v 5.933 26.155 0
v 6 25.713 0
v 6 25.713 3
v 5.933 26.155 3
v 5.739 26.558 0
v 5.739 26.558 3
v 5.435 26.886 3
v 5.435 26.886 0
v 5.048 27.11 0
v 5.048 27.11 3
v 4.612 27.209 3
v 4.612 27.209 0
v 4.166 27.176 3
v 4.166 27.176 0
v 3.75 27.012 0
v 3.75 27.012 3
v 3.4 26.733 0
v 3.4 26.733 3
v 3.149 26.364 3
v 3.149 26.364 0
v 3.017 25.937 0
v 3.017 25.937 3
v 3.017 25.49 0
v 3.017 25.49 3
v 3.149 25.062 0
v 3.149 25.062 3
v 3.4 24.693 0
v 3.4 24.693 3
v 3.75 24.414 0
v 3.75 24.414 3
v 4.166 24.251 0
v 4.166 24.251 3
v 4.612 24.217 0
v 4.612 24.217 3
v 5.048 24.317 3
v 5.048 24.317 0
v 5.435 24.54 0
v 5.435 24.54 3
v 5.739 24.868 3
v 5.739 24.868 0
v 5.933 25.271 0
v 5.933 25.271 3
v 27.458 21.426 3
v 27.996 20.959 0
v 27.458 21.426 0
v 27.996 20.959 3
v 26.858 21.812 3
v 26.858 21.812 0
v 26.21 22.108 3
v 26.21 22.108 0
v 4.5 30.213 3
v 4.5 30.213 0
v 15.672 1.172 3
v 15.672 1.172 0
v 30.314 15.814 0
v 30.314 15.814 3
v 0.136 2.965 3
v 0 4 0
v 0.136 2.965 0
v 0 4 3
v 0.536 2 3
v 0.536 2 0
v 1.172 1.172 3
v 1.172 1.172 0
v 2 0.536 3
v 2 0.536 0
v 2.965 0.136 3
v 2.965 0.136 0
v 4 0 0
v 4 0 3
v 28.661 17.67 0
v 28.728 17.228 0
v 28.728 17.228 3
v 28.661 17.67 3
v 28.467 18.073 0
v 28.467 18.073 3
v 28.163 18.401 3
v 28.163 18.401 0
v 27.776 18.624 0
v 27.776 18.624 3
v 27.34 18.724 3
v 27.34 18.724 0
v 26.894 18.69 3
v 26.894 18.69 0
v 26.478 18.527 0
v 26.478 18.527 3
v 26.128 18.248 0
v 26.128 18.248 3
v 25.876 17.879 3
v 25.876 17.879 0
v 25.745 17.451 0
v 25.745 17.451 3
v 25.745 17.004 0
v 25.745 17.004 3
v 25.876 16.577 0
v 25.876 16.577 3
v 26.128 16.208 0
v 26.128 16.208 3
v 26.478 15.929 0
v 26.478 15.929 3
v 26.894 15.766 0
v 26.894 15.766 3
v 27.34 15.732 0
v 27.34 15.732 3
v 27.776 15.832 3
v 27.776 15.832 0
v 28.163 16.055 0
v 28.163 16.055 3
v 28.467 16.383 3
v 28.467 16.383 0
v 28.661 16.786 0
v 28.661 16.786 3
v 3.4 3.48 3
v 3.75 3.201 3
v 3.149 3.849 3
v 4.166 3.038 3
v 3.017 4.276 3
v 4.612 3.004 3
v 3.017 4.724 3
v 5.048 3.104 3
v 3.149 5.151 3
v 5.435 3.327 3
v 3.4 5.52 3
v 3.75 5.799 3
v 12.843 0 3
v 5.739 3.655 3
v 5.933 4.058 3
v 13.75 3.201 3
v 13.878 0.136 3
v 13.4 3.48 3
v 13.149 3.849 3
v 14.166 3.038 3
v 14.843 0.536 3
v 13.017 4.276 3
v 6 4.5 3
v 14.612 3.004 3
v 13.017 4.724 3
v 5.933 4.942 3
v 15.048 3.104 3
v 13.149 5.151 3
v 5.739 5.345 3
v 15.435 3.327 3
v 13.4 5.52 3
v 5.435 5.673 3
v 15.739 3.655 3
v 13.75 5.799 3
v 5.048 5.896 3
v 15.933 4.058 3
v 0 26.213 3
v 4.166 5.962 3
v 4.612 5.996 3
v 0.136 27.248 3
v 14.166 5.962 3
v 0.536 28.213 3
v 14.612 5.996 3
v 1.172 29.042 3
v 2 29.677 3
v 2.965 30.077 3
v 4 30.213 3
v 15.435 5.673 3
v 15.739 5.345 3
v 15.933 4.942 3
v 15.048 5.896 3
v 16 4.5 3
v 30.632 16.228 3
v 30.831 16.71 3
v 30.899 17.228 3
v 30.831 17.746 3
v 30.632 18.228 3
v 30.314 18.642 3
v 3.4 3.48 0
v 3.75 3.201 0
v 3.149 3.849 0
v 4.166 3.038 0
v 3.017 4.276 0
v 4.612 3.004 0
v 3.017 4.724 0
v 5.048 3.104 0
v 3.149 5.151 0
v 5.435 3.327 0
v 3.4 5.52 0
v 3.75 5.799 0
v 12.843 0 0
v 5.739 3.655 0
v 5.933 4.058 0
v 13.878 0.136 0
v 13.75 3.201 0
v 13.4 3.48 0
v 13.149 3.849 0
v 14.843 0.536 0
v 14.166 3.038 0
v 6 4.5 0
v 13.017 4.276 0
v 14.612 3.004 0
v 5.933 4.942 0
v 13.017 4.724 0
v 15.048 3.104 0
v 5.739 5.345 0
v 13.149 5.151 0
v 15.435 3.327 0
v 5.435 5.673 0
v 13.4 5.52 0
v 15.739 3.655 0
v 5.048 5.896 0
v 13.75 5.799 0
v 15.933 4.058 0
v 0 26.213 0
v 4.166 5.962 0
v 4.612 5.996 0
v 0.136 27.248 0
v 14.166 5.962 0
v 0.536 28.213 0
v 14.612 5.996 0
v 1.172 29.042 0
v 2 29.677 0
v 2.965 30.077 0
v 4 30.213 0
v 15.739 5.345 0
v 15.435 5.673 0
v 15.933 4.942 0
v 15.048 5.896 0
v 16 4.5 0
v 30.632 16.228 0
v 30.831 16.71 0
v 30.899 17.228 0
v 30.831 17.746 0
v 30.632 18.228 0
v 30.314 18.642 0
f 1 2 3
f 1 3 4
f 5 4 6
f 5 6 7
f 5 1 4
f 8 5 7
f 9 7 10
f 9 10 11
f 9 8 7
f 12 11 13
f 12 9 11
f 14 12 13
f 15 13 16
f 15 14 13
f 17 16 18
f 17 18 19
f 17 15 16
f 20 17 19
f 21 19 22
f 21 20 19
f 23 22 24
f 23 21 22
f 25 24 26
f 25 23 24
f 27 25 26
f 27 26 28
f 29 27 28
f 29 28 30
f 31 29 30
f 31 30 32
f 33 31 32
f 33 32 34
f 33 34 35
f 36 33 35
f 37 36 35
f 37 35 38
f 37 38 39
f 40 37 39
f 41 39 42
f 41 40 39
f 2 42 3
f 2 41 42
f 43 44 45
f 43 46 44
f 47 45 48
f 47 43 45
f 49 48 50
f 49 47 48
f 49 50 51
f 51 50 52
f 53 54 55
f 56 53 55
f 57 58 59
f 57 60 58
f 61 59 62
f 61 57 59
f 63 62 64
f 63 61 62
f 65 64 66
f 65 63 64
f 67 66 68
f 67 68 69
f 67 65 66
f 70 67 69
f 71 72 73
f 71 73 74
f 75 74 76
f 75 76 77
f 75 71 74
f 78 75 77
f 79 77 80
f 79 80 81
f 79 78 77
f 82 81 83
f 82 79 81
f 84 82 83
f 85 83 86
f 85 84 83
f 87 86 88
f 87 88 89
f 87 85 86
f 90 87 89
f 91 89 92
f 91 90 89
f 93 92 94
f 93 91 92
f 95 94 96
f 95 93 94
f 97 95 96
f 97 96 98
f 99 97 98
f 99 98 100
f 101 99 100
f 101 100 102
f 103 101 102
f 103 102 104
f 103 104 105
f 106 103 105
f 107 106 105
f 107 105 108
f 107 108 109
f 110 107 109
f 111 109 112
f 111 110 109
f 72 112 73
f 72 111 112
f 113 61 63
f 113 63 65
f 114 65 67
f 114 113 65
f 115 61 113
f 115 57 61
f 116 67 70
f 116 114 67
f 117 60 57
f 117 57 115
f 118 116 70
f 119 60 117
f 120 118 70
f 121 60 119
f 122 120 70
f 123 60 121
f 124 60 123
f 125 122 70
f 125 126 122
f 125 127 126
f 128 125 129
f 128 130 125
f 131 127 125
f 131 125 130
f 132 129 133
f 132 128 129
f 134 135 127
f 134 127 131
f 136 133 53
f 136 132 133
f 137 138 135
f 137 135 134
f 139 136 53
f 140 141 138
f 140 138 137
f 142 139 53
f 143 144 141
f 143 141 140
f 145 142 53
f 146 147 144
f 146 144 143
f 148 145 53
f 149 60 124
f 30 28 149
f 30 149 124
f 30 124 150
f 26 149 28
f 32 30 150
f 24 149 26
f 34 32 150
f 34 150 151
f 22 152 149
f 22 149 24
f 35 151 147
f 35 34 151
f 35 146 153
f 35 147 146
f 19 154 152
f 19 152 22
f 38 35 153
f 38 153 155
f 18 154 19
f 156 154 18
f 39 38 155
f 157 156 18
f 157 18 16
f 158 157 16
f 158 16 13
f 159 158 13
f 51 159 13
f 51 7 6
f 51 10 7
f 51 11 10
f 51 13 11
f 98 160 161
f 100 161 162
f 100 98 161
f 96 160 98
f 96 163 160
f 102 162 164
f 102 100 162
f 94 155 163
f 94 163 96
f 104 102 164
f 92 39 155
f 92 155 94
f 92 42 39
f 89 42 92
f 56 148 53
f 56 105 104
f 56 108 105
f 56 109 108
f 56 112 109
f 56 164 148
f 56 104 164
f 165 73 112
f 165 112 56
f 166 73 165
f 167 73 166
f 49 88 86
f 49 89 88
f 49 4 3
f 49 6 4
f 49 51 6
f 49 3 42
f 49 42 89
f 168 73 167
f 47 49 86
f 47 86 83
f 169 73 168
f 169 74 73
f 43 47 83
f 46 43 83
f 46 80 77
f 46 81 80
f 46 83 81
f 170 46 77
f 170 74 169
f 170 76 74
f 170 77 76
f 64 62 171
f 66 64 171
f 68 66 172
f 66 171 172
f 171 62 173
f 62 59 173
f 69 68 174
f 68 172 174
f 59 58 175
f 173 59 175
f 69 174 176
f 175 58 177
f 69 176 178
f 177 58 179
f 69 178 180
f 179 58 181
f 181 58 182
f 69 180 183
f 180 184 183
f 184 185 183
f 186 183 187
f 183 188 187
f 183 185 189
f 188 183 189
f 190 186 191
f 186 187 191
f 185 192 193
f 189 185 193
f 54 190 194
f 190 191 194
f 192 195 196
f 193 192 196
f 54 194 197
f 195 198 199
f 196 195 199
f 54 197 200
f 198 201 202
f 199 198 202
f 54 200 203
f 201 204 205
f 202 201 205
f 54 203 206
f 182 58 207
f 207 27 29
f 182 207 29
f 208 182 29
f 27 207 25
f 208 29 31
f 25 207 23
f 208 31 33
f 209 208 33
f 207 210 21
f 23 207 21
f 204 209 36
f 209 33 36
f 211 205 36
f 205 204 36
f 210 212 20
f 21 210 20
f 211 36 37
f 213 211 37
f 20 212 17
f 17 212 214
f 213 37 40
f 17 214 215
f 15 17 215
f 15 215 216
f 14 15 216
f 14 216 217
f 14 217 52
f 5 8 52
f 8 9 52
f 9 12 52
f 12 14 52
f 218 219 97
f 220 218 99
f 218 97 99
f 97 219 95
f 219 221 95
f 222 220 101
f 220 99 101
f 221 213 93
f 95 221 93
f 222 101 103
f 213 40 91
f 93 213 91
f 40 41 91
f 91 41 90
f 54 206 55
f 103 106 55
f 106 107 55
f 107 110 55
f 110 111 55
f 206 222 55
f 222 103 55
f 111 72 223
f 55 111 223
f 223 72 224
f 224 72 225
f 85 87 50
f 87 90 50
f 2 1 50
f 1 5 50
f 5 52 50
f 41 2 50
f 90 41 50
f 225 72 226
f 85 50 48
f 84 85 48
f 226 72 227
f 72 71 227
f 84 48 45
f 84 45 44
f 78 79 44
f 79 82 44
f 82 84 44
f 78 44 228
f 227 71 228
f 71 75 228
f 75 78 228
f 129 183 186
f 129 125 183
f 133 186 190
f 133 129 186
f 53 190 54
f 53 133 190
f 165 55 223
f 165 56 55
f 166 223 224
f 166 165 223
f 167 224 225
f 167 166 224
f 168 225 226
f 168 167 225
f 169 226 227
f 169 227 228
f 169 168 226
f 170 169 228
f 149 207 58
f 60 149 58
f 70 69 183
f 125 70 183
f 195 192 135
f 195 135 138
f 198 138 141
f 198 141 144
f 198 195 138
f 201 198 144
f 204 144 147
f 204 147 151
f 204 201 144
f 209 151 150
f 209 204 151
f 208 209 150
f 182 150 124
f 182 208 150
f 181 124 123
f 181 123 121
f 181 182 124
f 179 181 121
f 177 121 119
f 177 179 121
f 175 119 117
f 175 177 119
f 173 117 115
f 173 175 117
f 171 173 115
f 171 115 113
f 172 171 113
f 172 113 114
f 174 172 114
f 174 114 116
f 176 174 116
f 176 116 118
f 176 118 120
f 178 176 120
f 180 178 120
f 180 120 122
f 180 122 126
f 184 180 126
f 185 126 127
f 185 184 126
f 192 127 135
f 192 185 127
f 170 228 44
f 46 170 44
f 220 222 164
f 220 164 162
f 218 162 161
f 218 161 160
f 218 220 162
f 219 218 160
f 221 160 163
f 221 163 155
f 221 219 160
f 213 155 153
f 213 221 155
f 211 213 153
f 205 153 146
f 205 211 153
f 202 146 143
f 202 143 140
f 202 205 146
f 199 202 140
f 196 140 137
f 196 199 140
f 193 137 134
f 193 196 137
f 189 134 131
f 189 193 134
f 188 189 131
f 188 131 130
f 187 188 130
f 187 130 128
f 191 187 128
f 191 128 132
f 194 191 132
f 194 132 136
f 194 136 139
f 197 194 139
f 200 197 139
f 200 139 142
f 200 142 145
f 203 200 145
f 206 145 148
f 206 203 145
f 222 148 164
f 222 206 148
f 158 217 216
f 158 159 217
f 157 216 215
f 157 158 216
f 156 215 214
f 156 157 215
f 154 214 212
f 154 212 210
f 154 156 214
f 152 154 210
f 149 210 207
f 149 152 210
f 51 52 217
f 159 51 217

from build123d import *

# Parameters (mm, degrees)
SKETCH1_R           = 1.5
BOSS_EXTRUDE1_DEPTH = 3
FILLET1_R           = 2
FILLET3_R           = 5
FILLET5_R           = 4
FILLET6_R           = 4
FILLET7_R           = 4


with BuildPart() as part:
    # Sketch1 → Boss-Extrude1 (new body)
    with BuildSketch(Plane.XY):
        Polygon((0, 0), (14.5, 0), (19, 4.5), (31.727922061, 17.227922061), (27.227922061, 21.727922061), (4.5, 30.213203436), (0, 30.213203436), align=None)
        with Locations((4.5, 25.713203436)):
            Circle(SKETCH1_R, mode=Mode.SUBTRACT)
        with Locations((4.5, 4.5)):
            Circle(SKETCH1_R, mode=Mode.SUBTRACT)
        with Locations((14.5, 4.5)):
            Circle(SKETCH1_R, mode=Mode.SUBTRACT)
        with Locations((27.227922061, 17.227922061)):
            Circle(SKETCH1_R, mode=Mode.SUBTRACT)
    extrude(amount=BOSS_EXTRUDE1_DEPTH)

    # Fillet1
    fillet1_edges = [part.edges().sort_by_distance(p)[0] for p in [
        (31.727922061, 17.227922061, 1.5),
    ]]
    fillet(fillet1_edges, radius=FILLET1_R)

    # Fillet3
    fillet3_edges = [part.edges().sort_by_distance(p)[0] for p in [
        (27.227922061, 21.727922061, 1.5),
    ]]
    fillet(fillet3_edges, radius=FILLET3_R)

    # Fillet5
    fillet5_edges = [part.edges().sort_by_distance(p)[0] for p in [
        (0, 30.213203436, 1.5),
    ]]
    fillet(fillet5_edges, radius=FILLET5_R)

    # Fillet6
    fillet6_edges = [part.edges().sort_by_distance(p)[0] for p in [
        (0, 0, 1.5),
    ]]
    fillet(fillet6_edges, radius=FILLET6_R)

    # Fillet7
    fillet7_edges = [part.edges().sort_by_distance(p)[0] for p in [
        (14.5, 0, 1.5),
    ]]
    fillet(fillet7_edges, radius=FILLET7_R)


solid = part.part
